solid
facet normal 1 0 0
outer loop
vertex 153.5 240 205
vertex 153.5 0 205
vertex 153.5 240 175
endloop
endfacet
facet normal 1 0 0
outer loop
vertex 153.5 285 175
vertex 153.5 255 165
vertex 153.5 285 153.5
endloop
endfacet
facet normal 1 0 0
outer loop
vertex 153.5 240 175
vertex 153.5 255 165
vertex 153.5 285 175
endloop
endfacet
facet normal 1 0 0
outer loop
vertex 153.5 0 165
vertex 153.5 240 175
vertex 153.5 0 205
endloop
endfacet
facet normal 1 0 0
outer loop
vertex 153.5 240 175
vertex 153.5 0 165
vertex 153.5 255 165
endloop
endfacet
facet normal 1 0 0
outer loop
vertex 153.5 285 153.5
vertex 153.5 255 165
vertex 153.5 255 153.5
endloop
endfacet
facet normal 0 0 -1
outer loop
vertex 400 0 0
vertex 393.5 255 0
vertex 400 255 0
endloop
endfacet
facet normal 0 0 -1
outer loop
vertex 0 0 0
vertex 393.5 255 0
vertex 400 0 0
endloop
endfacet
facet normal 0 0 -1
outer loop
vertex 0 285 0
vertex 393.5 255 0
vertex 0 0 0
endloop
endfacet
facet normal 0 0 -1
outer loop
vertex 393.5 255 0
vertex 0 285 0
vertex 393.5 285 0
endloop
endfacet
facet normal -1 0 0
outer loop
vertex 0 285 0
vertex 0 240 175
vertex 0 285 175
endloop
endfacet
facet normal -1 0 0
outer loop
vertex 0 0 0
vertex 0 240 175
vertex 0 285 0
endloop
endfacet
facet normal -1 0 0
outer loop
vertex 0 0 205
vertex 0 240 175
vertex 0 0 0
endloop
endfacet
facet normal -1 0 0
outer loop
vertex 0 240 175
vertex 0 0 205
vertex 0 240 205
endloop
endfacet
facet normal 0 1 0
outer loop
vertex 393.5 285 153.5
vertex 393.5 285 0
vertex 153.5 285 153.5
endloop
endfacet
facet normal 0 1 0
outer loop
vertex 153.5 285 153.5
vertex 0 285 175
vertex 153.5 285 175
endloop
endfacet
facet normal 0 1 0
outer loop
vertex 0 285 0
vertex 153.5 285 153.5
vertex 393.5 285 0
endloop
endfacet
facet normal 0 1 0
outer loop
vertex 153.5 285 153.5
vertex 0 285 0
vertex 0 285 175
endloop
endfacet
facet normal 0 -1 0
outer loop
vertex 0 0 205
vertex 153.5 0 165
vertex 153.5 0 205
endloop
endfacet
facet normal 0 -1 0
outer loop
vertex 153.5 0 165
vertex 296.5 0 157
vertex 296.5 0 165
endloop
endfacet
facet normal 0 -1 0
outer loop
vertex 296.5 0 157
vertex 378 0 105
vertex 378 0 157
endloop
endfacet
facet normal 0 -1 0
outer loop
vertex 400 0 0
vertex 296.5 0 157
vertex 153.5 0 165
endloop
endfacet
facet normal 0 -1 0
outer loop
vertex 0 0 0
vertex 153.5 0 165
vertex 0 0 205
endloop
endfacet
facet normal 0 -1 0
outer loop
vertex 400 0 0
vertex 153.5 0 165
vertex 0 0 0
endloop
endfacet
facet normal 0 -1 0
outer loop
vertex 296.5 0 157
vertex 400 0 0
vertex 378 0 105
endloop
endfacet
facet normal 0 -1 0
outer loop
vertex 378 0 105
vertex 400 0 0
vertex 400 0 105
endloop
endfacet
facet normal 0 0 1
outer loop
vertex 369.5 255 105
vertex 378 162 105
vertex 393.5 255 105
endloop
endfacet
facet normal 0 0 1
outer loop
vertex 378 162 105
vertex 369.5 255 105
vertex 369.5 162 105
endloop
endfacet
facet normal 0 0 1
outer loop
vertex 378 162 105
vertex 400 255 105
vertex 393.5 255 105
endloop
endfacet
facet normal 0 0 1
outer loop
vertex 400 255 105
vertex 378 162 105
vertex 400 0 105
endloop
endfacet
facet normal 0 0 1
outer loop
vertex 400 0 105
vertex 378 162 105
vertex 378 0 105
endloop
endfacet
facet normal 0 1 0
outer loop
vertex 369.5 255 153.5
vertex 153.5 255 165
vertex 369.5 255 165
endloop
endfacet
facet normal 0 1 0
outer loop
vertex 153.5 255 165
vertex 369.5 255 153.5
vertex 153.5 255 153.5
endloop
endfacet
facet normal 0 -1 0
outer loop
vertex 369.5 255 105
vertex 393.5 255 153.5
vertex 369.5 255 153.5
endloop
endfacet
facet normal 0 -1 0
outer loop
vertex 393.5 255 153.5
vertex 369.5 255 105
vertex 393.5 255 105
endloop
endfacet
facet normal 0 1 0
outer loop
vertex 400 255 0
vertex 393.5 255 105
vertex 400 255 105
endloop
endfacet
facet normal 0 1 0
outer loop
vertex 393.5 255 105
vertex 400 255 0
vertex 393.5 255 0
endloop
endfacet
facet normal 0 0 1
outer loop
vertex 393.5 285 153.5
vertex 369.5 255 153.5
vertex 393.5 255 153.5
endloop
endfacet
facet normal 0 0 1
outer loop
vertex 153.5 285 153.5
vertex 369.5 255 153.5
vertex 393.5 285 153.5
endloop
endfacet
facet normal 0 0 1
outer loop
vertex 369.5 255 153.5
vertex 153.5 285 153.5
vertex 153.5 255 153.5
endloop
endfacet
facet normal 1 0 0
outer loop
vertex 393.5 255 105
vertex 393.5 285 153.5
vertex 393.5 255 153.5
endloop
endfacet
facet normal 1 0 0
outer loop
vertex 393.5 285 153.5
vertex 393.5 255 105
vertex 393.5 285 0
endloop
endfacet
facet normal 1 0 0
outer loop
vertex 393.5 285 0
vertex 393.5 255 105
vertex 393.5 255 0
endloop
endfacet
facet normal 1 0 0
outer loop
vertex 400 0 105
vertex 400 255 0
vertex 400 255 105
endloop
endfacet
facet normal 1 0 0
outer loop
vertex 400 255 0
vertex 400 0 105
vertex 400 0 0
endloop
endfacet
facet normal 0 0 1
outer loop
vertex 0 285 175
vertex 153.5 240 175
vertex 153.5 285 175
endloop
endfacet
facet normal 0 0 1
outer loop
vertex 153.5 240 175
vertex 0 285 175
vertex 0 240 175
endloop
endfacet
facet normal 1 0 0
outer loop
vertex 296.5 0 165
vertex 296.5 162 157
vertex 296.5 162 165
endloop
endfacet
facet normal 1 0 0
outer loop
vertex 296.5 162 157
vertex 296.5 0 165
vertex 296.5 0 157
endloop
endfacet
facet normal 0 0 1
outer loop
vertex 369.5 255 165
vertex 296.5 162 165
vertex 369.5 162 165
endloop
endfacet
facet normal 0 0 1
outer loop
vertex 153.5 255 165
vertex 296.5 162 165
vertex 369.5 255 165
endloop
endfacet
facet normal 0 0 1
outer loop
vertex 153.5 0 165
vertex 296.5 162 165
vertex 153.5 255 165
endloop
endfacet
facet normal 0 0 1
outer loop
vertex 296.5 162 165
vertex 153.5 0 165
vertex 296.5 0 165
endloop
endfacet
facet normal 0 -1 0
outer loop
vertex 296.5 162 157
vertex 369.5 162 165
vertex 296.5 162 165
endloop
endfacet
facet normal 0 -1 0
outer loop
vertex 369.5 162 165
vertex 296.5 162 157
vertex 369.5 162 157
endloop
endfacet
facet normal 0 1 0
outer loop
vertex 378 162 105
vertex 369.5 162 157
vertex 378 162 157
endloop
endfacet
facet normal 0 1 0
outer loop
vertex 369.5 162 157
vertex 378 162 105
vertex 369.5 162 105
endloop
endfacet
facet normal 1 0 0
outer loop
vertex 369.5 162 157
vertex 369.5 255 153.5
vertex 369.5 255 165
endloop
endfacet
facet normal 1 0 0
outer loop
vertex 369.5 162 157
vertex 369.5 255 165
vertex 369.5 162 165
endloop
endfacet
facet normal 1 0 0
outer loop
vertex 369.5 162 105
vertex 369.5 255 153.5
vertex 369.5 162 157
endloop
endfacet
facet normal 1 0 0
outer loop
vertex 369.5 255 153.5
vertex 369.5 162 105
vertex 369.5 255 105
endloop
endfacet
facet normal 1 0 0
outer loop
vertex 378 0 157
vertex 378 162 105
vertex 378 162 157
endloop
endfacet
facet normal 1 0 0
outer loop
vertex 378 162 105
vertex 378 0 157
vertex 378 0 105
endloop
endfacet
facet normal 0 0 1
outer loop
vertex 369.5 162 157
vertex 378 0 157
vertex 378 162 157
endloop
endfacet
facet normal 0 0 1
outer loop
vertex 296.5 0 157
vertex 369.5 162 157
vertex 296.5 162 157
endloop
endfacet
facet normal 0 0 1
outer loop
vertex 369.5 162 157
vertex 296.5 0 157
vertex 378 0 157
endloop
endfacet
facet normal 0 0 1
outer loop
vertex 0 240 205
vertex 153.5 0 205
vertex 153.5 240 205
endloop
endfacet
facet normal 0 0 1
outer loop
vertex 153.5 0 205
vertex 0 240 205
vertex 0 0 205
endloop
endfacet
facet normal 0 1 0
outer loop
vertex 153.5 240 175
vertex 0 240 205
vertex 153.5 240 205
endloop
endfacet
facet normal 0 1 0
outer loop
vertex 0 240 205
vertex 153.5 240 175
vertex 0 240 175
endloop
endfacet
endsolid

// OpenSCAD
module box() { cube([400,285,240]); };
charX = 153.5;
charY = 285;
charZ = 122;
module characters() { cube([charX,charY,charZ]); };
monsX = 228-3.5;
monsY = 162-3;
monsZ = 25+21+21+21+17;
module monsterBoxes() { cube([monsX,monsY,monsZ]); };
//statsX = 20 + 2;
//statsY = 213.5;
//statsZ = 106.5;
//module monsterStats() { cube([statsX,statsY,statsZ]); };
largeCX = 207;
largeCZ = 105;
largeCY = 94 + 2;
module largeCardBox() { cube([largeCX,largeCY,largeCZ]); };
playerX = 153.5;
playerY = 120;
playerZ =  28 + 2;
module playerBox() { cube([playerX,playerY,playerZ]); };
statsX = 106+4;
statsY = 102.5 +4;
statsZ = 53;
module statsBox() { cube([statsX,statsY,statsZ]); };
smallCX = charX;
echo("small Cards Y");
smallCY = charY - statsY;
echo(smallCY);
smallCZ = statsZ;
module smallCardsBox() { cube([smallCX,smallCY,smallCZ]); };
damageX = smallCX - statsX;
echo(damageX);
damageY = statsY;
echo(damageZ);
damageZ = statsZ;
echo(damageZ);
module damageTokensBox() { cube([damageX,damageY,damageZ]); };
obsY = 156+6; // current size, can it shrink by 6?
obsX = 143;
obsZ = 60;
module obstacleBox() { cube([obsX,obsY,obsZ]); };
miniX =  216;
miniY = 93;
miniZ = 60;
module miniBox() { cube([miniX,miniY,miniZ]); };
bossX = 39.5;
bossY = largeCY;
bossZ = largeCZ;
module bossBox() { cube([bossX,bossY,bossZ]); };
envX = 78+4-0.5;
envY = 158 + 4;
envZ = 50+2;
module envelopeBox() { cube([envX,envY,envZ]); };
statusZ = monsZ;
statusY = monsY;
statusX = 22;
echo("status box");
echo(statusX);echo(statusY);echo(statusZ);
module statusBox() { cube([statusX,statusY,statusZ]); };

// Loot Cards
// Modifier Cards
// Battle Goal Cards


layer1 = true;
layer2 = true;
layer3 = true;


//color("red",0.10) box();

if (layer1) {
    color("white") characters();
    translate([charX,0,0]) color("grey") monsterBoxes();
    //translate([charX+monsX,0,0]) color("beige") monsterStats();
    // This is on its side
    translate([charX,monsY,0]) color("blue") largeCardBox();
    translate([charX+playerY,monsY+largeCY+playerZ,0]) rotate([90,-90,0]) color("purple") playerBox();
    translate([charX+(2*playerY),monsY+largeCY+playerZ,0]) rotate([90,-90,0]) color("LimeGreen") playerBox();
    translate([charX+largeCX,monsY,0]) color("Black") bossBox();
    translate([charX+monsX,0,0]) color("Chocolate") statusBox();
}  
if (layer2) {  
    translate([0,charY-statsY,charZ]) color("orange") statsBox();
    translate([0,0,charZ]) color("Magenta") smallCardsBox();
    translate([statsX,smallCY,charZ]) color("red") damageTokensBox();
    rotate([0,0,0]) translate([charX,0,monsZ]) color("LightSalmon") obstacleBox();
    translate([charX,obsY,largeCZ]) color("Gold") miniBox();
    translate([charX+obsX,0,monsZ]) color("Aqua") envelopeBox();
}
if (layer3) {
     translate([0,0,charZ+smallCZ]) rotate([0,0,0]) color("Coral") playerBox();
     translate([0,playerY,charZ+smallCZ]) rotate([0,0,0]) color("Teal") playerBox();
}
